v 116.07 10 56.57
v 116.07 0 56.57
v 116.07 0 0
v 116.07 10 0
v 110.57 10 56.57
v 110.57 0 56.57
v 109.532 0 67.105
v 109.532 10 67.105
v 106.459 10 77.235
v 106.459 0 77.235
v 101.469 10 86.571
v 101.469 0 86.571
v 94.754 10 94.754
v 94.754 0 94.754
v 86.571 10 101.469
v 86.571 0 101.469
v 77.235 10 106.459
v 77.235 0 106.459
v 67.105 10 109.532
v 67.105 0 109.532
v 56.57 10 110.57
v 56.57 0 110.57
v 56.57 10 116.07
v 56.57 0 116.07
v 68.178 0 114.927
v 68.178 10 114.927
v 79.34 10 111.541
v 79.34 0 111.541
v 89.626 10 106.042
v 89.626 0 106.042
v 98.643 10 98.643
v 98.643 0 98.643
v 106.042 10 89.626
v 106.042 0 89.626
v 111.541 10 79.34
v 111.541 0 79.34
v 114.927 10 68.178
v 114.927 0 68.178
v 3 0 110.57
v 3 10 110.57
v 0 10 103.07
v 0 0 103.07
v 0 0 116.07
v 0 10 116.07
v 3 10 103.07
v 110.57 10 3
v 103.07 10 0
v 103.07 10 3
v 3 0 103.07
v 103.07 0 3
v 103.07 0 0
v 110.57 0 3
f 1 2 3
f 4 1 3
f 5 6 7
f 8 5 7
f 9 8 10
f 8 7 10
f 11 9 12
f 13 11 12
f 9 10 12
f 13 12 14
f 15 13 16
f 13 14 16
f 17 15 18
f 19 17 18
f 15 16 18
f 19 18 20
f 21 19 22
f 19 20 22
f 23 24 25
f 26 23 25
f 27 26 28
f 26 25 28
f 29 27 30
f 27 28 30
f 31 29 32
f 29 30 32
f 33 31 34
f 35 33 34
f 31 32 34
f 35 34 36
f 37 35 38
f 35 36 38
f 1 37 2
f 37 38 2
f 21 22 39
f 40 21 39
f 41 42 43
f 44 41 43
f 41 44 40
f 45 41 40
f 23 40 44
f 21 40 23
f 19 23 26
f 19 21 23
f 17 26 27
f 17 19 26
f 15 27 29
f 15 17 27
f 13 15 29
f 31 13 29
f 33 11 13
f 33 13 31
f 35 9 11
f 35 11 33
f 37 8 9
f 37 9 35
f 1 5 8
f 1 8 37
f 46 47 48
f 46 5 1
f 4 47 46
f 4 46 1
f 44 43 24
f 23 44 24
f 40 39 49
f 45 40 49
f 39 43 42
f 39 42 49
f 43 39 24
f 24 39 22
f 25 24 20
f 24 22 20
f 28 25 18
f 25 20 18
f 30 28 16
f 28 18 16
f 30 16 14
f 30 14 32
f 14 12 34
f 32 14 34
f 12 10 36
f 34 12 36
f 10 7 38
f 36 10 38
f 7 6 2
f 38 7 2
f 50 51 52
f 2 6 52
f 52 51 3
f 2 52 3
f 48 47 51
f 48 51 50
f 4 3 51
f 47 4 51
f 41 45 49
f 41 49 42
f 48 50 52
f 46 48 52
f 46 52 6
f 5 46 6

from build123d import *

# Parameters (mm, degrees)
BOSS_EXTRUDE1_DEPTH = 10


with BuildPart() as part:
    # Sketch1 → Boss-Extrude1 (new body)
    with BuildSketch(Plane(origin=(0, 0, 0), x_dir=(1, 0, 0), z_dir=(0, 1, 0))):
        with BuildLine():
            Line((0, -116.07), (56.57, -116.07))
            ThreePointArc((56.57, -116.07), (98.642853481, -98.642853481), (116.07, -56.57))
            Line((116.07, -56.57), (116.07, 0))
            Line((116.07, 0), (103.07, 0))
            Line((103.07, 0), (103.07, -3))
            Line((103.07, -3), (110.57, -3))
            Line((110.57, -3), (110.57, -56.57))
            ThreePointArc((110.57, -56.57), (94.753766184, -94.753766184), (56.57, -110.57))
            Line((56.57, -110.57), (3, -110.57))
            Line((3, -110.57), (3, -103.07))
            Line((3, -103.07), (0, -103.07))
            Line((0, -103.07), (0, -116.07))
        make_face()
    extrude(amount=BOSS_EXTRUDE1_DEPTH)


solid = part.part
